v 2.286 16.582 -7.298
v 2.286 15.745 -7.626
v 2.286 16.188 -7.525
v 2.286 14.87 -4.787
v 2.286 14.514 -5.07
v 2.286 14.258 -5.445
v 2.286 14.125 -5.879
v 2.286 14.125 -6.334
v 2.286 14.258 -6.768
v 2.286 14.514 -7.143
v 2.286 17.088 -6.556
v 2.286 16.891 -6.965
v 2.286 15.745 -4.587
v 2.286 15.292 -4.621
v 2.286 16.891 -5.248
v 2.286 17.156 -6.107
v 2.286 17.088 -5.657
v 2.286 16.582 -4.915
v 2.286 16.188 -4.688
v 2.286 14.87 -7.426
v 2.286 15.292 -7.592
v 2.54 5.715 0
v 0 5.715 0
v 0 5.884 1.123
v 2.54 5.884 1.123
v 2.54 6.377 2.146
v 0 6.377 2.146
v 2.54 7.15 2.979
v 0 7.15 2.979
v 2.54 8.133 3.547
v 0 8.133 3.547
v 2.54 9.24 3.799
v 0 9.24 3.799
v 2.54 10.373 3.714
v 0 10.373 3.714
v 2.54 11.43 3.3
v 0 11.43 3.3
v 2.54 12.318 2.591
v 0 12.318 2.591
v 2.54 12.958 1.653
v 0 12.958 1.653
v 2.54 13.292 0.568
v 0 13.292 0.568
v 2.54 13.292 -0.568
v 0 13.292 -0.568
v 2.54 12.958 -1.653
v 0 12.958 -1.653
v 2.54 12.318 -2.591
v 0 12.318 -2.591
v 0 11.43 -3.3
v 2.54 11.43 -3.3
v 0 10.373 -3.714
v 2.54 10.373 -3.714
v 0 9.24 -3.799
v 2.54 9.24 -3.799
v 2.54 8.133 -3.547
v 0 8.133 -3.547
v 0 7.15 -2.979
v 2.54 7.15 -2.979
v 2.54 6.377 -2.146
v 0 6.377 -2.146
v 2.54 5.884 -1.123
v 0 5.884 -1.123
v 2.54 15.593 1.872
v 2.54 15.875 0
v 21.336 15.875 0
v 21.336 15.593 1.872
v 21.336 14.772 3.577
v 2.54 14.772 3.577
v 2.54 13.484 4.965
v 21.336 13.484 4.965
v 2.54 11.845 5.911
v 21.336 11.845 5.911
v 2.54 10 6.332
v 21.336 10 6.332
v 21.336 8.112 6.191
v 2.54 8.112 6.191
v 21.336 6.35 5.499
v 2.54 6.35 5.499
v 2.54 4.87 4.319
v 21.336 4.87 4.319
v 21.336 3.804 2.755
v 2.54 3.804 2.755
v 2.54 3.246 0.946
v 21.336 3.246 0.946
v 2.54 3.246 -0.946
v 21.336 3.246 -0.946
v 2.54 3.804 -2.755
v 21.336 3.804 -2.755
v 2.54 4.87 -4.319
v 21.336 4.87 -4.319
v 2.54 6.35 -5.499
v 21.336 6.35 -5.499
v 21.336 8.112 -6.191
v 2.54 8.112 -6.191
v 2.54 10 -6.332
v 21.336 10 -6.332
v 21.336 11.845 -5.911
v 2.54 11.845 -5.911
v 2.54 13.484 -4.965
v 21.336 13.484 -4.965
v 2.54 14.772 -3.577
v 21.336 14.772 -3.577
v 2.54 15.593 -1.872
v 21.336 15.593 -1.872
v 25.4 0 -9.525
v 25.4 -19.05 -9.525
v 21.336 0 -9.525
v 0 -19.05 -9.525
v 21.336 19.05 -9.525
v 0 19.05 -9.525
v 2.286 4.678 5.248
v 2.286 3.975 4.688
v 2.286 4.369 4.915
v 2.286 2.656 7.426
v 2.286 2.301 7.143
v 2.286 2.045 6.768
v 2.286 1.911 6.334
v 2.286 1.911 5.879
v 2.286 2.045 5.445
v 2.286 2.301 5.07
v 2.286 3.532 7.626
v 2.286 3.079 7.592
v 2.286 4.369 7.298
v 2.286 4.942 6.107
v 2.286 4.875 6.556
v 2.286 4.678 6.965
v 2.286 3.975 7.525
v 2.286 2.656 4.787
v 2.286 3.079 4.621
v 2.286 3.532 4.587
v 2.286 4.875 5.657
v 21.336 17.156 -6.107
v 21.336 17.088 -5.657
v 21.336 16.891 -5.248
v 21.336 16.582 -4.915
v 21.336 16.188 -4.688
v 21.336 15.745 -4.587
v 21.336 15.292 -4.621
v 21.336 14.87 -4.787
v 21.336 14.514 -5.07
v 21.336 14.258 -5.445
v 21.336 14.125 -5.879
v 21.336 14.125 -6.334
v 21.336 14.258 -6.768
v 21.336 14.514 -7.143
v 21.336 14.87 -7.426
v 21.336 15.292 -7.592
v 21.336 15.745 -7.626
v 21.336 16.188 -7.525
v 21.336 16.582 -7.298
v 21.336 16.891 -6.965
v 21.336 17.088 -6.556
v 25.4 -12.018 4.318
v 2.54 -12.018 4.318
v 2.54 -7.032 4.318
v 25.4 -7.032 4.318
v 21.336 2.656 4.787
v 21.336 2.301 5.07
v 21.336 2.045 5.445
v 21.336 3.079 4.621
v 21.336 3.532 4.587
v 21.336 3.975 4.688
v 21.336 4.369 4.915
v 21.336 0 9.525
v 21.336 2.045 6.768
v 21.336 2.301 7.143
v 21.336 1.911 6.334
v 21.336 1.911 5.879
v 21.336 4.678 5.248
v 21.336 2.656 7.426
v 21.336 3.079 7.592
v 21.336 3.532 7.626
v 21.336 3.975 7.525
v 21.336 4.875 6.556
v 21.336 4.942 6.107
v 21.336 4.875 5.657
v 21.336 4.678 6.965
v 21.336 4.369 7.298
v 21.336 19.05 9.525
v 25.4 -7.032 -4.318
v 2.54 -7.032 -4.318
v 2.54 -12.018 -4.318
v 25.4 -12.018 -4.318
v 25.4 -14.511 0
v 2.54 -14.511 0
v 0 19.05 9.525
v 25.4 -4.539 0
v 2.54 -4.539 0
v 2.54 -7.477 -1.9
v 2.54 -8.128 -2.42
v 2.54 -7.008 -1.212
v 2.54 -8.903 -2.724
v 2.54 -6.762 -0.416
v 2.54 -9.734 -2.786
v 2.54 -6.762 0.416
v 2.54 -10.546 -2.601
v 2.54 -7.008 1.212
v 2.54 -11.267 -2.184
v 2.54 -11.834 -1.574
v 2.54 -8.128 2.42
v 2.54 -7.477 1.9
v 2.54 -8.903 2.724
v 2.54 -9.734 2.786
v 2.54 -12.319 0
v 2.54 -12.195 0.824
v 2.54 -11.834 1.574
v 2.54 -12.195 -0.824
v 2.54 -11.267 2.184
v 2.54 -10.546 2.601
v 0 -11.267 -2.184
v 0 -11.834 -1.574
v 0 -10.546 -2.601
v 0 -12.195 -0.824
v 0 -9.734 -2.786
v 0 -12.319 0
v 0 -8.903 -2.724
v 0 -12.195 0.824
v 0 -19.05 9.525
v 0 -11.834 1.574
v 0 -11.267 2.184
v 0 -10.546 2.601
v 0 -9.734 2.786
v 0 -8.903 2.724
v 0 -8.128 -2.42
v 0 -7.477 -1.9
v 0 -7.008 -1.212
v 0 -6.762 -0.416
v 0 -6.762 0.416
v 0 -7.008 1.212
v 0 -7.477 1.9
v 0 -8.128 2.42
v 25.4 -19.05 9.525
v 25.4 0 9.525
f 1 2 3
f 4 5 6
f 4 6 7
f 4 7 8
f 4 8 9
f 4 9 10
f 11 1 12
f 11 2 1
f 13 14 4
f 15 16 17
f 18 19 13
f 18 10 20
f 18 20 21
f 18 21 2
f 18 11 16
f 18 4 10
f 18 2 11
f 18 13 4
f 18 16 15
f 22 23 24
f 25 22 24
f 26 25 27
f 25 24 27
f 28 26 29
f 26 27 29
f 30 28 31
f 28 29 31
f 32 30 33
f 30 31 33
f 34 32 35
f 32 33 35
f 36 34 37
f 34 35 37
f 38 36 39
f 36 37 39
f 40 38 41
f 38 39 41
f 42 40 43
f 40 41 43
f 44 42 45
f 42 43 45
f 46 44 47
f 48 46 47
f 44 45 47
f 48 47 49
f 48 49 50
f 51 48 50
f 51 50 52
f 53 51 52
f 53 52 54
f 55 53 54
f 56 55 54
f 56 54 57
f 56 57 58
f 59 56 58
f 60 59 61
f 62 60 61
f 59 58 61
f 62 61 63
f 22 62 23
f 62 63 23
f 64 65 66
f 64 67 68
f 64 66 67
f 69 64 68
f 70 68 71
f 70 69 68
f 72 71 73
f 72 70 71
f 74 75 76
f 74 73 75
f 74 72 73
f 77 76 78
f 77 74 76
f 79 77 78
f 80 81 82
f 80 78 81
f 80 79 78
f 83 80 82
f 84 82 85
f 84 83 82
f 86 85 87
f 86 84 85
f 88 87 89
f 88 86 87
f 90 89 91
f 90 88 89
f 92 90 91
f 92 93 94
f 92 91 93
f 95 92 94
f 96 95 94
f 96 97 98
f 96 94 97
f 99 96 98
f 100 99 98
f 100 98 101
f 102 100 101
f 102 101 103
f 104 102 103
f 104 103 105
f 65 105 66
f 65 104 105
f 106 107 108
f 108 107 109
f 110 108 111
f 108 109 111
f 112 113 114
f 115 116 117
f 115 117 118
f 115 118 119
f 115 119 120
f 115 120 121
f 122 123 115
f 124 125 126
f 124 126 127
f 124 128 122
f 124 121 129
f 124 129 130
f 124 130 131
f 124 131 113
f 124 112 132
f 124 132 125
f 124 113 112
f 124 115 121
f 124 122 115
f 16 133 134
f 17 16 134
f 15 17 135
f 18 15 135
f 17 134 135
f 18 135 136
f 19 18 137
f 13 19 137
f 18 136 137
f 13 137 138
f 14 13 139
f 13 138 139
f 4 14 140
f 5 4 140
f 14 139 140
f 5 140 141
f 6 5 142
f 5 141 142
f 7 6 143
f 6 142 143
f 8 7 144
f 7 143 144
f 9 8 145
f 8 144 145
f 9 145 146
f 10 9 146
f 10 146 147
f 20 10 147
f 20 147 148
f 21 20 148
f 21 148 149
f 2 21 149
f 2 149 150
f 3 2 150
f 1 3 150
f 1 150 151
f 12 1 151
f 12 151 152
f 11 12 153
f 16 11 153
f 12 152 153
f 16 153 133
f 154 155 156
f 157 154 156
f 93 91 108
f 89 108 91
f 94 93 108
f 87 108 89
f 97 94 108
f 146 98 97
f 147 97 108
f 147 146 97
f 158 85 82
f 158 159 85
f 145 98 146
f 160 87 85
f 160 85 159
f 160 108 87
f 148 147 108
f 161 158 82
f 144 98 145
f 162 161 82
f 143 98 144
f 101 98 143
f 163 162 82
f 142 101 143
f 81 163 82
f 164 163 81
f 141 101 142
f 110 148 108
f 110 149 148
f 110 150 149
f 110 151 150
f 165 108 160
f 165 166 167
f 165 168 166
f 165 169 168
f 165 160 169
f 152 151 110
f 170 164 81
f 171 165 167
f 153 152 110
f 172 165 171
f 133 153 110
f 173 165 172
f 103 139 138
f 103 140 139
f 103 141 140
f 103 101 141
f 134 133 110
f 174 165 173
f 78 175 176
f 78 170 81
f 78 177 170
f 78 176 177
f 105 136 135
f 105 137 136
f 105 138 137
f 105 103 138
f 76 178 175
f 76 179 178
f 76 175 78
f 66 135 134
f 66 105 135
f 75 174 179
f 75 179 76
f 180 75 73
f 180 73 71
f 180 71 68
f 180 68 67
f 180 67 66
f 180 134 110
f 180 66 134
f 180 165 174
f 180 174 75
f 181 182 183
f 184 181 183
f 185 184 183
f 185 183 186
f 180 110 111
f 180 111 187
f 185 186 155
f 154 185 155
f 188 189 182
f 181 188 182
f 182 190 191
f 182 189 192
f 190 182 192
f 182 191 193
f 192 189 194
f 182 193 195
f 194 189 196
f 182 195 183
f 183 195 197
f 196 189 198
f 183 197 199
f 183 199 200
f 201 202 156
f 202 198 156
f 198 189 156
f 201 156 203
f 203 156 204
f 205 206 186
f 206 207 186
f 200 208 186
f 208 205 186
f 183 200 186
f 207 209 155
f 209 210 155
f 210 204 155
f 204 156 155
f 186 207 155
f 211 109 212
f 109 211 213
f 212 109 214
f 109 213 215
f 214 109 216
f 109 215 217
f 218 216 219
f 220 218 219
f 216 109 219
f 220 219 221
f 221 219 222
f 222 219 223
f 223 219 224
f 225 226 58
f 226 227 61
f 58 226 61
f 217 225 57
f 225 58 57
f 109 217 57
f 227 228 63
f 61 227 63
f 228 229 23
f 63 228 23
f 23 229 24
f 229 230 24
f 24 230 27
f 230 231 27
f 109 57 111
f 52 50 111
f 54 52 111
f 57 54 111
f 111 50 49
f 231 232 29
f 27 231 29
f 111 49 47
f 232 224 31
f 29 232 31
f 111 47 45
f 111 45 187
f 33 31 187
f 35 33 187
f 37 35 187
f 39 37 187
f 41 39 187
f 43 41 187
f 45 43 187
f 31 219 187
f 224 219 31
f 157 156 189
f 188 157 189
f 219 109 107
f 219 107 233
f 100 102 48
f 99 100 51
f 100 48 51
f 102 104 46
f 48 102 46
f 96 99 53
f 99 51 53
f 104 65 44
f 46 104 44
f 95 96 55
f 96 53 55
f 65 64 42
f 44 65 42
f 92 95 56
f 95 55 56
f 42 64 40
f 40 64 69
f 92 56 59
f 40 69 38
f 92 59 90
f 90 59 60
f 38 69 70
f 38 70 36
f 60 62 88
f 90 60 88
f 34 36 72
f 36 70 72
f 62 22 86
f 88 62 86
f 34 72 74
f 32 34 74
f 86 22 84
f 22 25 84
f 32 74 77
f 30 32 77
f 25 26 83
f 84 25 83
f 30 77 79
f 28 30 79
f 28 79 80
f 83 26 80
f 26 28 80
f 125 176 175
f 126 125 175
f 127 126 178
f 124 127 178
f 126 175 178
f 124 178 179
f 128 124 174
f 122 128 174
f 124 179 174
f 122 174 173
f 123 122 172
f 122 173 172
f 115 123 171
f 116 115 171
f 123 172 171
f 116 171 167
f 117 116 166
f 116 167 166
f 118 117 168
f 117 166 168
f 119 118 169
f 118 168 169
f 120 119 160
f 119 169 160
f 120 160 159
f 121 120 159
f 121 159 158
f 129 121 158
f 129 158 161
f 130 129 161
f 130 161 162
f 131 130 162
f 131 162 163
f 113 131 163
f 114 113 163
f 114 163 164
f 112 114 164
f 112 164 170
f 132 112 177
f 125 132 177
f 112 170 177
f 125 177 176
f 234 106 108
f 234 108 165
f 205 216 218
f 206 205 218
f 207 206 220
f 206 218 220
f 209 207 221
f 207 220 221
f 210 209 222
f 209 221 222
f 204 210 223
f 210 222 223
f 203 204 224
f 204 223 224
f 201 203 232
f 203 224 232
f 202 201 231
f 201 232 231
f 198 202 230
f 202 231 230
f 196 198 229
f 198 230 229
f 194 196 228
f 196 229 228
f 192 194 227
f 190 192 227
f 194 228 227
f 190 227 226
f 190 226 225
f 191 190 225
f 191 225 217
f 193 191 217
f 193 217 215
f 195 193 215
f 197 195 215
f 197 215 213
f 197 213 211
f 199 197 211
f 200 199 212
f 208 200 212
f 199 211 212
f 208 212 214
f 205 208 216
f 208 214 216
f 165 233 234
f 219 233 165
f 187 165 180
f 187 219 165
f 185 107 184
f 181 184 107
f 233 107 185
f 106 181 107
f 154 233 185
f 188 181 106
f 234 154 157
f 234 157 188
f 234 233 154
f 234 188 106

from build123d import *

# Parameters (mm, degrees)
F0_W     = 38.1
F0_H     = 19.05
F0_R     = 6.35
F1_DEPTH = 25.4
F2_W     = 38.1
F2_H     = 19.05
F2_R     = 3.81
F2_R_2   = 2.794
F3_DEPTH = 2.54
F4_W     = 19.05
F4_H     = 19.05
F5_DEPTH = 4.064
F6_R     = 1.524
F7_DEPTH = 19.05


with BuildPart() as f1:
    # F0 (on Right) → F1 (new body)
    with BuildSketch(Plane.YZ):
        Rectangle(F0_W, F0_H)
        Polygon((-14.510997, 0), (-12.017998, 4.318), (-7.032002, 4.318), (-4.539003, 0), (-7.032002, -4.318), (-12.017998, -4.318), align=None, mode=Mode.SUBTRACT)
        with Locations((9.525, 0)):
            Circle(F0_R, mode=Mode.SUBTRACT)
    extrude(amount=F1_DEPTH)

    # F2 (on face) → F3 (join)
    with BuildSketch(Plane(origin=(0, 0, 0), x_dir=(0, -1, 0), z_dir=(-1, 0, 0))):
        Rectangle(F2_W, F2_H)
        with Locations((-9.525, 0)):
            Circle(F2_R, mode=Mode.SUBTRACT)
        with Locations((9.525, 0)):
            Circle(F2_R_2, mode=Mode.SUBTRACT)
    extrude(amount=-F3_DEPTH)

    # F4 (on face) → F5 (cut)
    with BuildSketch(Plane.YZ.offset(25.4)):
        with Locations((9.525, 0)):
            Rectangle(F4_W, F4_H)
    extrude(amount=-F5_DEPTH, mode=Mode.SUBTRACT)

    # F6 (on face) → F7 (cut)
    with BuildSketch(Plane.YZ.offset(21.336)):
        with Locations((3.418426, 6.106574)):
            Circle(F6_R)
        with Locations((15.631574, -6.106574)):
            Circle(F6_R)
    extrude(amount=-F7_DEPTH, mode=Mode.SUBTRACT)


solid = f1.part
